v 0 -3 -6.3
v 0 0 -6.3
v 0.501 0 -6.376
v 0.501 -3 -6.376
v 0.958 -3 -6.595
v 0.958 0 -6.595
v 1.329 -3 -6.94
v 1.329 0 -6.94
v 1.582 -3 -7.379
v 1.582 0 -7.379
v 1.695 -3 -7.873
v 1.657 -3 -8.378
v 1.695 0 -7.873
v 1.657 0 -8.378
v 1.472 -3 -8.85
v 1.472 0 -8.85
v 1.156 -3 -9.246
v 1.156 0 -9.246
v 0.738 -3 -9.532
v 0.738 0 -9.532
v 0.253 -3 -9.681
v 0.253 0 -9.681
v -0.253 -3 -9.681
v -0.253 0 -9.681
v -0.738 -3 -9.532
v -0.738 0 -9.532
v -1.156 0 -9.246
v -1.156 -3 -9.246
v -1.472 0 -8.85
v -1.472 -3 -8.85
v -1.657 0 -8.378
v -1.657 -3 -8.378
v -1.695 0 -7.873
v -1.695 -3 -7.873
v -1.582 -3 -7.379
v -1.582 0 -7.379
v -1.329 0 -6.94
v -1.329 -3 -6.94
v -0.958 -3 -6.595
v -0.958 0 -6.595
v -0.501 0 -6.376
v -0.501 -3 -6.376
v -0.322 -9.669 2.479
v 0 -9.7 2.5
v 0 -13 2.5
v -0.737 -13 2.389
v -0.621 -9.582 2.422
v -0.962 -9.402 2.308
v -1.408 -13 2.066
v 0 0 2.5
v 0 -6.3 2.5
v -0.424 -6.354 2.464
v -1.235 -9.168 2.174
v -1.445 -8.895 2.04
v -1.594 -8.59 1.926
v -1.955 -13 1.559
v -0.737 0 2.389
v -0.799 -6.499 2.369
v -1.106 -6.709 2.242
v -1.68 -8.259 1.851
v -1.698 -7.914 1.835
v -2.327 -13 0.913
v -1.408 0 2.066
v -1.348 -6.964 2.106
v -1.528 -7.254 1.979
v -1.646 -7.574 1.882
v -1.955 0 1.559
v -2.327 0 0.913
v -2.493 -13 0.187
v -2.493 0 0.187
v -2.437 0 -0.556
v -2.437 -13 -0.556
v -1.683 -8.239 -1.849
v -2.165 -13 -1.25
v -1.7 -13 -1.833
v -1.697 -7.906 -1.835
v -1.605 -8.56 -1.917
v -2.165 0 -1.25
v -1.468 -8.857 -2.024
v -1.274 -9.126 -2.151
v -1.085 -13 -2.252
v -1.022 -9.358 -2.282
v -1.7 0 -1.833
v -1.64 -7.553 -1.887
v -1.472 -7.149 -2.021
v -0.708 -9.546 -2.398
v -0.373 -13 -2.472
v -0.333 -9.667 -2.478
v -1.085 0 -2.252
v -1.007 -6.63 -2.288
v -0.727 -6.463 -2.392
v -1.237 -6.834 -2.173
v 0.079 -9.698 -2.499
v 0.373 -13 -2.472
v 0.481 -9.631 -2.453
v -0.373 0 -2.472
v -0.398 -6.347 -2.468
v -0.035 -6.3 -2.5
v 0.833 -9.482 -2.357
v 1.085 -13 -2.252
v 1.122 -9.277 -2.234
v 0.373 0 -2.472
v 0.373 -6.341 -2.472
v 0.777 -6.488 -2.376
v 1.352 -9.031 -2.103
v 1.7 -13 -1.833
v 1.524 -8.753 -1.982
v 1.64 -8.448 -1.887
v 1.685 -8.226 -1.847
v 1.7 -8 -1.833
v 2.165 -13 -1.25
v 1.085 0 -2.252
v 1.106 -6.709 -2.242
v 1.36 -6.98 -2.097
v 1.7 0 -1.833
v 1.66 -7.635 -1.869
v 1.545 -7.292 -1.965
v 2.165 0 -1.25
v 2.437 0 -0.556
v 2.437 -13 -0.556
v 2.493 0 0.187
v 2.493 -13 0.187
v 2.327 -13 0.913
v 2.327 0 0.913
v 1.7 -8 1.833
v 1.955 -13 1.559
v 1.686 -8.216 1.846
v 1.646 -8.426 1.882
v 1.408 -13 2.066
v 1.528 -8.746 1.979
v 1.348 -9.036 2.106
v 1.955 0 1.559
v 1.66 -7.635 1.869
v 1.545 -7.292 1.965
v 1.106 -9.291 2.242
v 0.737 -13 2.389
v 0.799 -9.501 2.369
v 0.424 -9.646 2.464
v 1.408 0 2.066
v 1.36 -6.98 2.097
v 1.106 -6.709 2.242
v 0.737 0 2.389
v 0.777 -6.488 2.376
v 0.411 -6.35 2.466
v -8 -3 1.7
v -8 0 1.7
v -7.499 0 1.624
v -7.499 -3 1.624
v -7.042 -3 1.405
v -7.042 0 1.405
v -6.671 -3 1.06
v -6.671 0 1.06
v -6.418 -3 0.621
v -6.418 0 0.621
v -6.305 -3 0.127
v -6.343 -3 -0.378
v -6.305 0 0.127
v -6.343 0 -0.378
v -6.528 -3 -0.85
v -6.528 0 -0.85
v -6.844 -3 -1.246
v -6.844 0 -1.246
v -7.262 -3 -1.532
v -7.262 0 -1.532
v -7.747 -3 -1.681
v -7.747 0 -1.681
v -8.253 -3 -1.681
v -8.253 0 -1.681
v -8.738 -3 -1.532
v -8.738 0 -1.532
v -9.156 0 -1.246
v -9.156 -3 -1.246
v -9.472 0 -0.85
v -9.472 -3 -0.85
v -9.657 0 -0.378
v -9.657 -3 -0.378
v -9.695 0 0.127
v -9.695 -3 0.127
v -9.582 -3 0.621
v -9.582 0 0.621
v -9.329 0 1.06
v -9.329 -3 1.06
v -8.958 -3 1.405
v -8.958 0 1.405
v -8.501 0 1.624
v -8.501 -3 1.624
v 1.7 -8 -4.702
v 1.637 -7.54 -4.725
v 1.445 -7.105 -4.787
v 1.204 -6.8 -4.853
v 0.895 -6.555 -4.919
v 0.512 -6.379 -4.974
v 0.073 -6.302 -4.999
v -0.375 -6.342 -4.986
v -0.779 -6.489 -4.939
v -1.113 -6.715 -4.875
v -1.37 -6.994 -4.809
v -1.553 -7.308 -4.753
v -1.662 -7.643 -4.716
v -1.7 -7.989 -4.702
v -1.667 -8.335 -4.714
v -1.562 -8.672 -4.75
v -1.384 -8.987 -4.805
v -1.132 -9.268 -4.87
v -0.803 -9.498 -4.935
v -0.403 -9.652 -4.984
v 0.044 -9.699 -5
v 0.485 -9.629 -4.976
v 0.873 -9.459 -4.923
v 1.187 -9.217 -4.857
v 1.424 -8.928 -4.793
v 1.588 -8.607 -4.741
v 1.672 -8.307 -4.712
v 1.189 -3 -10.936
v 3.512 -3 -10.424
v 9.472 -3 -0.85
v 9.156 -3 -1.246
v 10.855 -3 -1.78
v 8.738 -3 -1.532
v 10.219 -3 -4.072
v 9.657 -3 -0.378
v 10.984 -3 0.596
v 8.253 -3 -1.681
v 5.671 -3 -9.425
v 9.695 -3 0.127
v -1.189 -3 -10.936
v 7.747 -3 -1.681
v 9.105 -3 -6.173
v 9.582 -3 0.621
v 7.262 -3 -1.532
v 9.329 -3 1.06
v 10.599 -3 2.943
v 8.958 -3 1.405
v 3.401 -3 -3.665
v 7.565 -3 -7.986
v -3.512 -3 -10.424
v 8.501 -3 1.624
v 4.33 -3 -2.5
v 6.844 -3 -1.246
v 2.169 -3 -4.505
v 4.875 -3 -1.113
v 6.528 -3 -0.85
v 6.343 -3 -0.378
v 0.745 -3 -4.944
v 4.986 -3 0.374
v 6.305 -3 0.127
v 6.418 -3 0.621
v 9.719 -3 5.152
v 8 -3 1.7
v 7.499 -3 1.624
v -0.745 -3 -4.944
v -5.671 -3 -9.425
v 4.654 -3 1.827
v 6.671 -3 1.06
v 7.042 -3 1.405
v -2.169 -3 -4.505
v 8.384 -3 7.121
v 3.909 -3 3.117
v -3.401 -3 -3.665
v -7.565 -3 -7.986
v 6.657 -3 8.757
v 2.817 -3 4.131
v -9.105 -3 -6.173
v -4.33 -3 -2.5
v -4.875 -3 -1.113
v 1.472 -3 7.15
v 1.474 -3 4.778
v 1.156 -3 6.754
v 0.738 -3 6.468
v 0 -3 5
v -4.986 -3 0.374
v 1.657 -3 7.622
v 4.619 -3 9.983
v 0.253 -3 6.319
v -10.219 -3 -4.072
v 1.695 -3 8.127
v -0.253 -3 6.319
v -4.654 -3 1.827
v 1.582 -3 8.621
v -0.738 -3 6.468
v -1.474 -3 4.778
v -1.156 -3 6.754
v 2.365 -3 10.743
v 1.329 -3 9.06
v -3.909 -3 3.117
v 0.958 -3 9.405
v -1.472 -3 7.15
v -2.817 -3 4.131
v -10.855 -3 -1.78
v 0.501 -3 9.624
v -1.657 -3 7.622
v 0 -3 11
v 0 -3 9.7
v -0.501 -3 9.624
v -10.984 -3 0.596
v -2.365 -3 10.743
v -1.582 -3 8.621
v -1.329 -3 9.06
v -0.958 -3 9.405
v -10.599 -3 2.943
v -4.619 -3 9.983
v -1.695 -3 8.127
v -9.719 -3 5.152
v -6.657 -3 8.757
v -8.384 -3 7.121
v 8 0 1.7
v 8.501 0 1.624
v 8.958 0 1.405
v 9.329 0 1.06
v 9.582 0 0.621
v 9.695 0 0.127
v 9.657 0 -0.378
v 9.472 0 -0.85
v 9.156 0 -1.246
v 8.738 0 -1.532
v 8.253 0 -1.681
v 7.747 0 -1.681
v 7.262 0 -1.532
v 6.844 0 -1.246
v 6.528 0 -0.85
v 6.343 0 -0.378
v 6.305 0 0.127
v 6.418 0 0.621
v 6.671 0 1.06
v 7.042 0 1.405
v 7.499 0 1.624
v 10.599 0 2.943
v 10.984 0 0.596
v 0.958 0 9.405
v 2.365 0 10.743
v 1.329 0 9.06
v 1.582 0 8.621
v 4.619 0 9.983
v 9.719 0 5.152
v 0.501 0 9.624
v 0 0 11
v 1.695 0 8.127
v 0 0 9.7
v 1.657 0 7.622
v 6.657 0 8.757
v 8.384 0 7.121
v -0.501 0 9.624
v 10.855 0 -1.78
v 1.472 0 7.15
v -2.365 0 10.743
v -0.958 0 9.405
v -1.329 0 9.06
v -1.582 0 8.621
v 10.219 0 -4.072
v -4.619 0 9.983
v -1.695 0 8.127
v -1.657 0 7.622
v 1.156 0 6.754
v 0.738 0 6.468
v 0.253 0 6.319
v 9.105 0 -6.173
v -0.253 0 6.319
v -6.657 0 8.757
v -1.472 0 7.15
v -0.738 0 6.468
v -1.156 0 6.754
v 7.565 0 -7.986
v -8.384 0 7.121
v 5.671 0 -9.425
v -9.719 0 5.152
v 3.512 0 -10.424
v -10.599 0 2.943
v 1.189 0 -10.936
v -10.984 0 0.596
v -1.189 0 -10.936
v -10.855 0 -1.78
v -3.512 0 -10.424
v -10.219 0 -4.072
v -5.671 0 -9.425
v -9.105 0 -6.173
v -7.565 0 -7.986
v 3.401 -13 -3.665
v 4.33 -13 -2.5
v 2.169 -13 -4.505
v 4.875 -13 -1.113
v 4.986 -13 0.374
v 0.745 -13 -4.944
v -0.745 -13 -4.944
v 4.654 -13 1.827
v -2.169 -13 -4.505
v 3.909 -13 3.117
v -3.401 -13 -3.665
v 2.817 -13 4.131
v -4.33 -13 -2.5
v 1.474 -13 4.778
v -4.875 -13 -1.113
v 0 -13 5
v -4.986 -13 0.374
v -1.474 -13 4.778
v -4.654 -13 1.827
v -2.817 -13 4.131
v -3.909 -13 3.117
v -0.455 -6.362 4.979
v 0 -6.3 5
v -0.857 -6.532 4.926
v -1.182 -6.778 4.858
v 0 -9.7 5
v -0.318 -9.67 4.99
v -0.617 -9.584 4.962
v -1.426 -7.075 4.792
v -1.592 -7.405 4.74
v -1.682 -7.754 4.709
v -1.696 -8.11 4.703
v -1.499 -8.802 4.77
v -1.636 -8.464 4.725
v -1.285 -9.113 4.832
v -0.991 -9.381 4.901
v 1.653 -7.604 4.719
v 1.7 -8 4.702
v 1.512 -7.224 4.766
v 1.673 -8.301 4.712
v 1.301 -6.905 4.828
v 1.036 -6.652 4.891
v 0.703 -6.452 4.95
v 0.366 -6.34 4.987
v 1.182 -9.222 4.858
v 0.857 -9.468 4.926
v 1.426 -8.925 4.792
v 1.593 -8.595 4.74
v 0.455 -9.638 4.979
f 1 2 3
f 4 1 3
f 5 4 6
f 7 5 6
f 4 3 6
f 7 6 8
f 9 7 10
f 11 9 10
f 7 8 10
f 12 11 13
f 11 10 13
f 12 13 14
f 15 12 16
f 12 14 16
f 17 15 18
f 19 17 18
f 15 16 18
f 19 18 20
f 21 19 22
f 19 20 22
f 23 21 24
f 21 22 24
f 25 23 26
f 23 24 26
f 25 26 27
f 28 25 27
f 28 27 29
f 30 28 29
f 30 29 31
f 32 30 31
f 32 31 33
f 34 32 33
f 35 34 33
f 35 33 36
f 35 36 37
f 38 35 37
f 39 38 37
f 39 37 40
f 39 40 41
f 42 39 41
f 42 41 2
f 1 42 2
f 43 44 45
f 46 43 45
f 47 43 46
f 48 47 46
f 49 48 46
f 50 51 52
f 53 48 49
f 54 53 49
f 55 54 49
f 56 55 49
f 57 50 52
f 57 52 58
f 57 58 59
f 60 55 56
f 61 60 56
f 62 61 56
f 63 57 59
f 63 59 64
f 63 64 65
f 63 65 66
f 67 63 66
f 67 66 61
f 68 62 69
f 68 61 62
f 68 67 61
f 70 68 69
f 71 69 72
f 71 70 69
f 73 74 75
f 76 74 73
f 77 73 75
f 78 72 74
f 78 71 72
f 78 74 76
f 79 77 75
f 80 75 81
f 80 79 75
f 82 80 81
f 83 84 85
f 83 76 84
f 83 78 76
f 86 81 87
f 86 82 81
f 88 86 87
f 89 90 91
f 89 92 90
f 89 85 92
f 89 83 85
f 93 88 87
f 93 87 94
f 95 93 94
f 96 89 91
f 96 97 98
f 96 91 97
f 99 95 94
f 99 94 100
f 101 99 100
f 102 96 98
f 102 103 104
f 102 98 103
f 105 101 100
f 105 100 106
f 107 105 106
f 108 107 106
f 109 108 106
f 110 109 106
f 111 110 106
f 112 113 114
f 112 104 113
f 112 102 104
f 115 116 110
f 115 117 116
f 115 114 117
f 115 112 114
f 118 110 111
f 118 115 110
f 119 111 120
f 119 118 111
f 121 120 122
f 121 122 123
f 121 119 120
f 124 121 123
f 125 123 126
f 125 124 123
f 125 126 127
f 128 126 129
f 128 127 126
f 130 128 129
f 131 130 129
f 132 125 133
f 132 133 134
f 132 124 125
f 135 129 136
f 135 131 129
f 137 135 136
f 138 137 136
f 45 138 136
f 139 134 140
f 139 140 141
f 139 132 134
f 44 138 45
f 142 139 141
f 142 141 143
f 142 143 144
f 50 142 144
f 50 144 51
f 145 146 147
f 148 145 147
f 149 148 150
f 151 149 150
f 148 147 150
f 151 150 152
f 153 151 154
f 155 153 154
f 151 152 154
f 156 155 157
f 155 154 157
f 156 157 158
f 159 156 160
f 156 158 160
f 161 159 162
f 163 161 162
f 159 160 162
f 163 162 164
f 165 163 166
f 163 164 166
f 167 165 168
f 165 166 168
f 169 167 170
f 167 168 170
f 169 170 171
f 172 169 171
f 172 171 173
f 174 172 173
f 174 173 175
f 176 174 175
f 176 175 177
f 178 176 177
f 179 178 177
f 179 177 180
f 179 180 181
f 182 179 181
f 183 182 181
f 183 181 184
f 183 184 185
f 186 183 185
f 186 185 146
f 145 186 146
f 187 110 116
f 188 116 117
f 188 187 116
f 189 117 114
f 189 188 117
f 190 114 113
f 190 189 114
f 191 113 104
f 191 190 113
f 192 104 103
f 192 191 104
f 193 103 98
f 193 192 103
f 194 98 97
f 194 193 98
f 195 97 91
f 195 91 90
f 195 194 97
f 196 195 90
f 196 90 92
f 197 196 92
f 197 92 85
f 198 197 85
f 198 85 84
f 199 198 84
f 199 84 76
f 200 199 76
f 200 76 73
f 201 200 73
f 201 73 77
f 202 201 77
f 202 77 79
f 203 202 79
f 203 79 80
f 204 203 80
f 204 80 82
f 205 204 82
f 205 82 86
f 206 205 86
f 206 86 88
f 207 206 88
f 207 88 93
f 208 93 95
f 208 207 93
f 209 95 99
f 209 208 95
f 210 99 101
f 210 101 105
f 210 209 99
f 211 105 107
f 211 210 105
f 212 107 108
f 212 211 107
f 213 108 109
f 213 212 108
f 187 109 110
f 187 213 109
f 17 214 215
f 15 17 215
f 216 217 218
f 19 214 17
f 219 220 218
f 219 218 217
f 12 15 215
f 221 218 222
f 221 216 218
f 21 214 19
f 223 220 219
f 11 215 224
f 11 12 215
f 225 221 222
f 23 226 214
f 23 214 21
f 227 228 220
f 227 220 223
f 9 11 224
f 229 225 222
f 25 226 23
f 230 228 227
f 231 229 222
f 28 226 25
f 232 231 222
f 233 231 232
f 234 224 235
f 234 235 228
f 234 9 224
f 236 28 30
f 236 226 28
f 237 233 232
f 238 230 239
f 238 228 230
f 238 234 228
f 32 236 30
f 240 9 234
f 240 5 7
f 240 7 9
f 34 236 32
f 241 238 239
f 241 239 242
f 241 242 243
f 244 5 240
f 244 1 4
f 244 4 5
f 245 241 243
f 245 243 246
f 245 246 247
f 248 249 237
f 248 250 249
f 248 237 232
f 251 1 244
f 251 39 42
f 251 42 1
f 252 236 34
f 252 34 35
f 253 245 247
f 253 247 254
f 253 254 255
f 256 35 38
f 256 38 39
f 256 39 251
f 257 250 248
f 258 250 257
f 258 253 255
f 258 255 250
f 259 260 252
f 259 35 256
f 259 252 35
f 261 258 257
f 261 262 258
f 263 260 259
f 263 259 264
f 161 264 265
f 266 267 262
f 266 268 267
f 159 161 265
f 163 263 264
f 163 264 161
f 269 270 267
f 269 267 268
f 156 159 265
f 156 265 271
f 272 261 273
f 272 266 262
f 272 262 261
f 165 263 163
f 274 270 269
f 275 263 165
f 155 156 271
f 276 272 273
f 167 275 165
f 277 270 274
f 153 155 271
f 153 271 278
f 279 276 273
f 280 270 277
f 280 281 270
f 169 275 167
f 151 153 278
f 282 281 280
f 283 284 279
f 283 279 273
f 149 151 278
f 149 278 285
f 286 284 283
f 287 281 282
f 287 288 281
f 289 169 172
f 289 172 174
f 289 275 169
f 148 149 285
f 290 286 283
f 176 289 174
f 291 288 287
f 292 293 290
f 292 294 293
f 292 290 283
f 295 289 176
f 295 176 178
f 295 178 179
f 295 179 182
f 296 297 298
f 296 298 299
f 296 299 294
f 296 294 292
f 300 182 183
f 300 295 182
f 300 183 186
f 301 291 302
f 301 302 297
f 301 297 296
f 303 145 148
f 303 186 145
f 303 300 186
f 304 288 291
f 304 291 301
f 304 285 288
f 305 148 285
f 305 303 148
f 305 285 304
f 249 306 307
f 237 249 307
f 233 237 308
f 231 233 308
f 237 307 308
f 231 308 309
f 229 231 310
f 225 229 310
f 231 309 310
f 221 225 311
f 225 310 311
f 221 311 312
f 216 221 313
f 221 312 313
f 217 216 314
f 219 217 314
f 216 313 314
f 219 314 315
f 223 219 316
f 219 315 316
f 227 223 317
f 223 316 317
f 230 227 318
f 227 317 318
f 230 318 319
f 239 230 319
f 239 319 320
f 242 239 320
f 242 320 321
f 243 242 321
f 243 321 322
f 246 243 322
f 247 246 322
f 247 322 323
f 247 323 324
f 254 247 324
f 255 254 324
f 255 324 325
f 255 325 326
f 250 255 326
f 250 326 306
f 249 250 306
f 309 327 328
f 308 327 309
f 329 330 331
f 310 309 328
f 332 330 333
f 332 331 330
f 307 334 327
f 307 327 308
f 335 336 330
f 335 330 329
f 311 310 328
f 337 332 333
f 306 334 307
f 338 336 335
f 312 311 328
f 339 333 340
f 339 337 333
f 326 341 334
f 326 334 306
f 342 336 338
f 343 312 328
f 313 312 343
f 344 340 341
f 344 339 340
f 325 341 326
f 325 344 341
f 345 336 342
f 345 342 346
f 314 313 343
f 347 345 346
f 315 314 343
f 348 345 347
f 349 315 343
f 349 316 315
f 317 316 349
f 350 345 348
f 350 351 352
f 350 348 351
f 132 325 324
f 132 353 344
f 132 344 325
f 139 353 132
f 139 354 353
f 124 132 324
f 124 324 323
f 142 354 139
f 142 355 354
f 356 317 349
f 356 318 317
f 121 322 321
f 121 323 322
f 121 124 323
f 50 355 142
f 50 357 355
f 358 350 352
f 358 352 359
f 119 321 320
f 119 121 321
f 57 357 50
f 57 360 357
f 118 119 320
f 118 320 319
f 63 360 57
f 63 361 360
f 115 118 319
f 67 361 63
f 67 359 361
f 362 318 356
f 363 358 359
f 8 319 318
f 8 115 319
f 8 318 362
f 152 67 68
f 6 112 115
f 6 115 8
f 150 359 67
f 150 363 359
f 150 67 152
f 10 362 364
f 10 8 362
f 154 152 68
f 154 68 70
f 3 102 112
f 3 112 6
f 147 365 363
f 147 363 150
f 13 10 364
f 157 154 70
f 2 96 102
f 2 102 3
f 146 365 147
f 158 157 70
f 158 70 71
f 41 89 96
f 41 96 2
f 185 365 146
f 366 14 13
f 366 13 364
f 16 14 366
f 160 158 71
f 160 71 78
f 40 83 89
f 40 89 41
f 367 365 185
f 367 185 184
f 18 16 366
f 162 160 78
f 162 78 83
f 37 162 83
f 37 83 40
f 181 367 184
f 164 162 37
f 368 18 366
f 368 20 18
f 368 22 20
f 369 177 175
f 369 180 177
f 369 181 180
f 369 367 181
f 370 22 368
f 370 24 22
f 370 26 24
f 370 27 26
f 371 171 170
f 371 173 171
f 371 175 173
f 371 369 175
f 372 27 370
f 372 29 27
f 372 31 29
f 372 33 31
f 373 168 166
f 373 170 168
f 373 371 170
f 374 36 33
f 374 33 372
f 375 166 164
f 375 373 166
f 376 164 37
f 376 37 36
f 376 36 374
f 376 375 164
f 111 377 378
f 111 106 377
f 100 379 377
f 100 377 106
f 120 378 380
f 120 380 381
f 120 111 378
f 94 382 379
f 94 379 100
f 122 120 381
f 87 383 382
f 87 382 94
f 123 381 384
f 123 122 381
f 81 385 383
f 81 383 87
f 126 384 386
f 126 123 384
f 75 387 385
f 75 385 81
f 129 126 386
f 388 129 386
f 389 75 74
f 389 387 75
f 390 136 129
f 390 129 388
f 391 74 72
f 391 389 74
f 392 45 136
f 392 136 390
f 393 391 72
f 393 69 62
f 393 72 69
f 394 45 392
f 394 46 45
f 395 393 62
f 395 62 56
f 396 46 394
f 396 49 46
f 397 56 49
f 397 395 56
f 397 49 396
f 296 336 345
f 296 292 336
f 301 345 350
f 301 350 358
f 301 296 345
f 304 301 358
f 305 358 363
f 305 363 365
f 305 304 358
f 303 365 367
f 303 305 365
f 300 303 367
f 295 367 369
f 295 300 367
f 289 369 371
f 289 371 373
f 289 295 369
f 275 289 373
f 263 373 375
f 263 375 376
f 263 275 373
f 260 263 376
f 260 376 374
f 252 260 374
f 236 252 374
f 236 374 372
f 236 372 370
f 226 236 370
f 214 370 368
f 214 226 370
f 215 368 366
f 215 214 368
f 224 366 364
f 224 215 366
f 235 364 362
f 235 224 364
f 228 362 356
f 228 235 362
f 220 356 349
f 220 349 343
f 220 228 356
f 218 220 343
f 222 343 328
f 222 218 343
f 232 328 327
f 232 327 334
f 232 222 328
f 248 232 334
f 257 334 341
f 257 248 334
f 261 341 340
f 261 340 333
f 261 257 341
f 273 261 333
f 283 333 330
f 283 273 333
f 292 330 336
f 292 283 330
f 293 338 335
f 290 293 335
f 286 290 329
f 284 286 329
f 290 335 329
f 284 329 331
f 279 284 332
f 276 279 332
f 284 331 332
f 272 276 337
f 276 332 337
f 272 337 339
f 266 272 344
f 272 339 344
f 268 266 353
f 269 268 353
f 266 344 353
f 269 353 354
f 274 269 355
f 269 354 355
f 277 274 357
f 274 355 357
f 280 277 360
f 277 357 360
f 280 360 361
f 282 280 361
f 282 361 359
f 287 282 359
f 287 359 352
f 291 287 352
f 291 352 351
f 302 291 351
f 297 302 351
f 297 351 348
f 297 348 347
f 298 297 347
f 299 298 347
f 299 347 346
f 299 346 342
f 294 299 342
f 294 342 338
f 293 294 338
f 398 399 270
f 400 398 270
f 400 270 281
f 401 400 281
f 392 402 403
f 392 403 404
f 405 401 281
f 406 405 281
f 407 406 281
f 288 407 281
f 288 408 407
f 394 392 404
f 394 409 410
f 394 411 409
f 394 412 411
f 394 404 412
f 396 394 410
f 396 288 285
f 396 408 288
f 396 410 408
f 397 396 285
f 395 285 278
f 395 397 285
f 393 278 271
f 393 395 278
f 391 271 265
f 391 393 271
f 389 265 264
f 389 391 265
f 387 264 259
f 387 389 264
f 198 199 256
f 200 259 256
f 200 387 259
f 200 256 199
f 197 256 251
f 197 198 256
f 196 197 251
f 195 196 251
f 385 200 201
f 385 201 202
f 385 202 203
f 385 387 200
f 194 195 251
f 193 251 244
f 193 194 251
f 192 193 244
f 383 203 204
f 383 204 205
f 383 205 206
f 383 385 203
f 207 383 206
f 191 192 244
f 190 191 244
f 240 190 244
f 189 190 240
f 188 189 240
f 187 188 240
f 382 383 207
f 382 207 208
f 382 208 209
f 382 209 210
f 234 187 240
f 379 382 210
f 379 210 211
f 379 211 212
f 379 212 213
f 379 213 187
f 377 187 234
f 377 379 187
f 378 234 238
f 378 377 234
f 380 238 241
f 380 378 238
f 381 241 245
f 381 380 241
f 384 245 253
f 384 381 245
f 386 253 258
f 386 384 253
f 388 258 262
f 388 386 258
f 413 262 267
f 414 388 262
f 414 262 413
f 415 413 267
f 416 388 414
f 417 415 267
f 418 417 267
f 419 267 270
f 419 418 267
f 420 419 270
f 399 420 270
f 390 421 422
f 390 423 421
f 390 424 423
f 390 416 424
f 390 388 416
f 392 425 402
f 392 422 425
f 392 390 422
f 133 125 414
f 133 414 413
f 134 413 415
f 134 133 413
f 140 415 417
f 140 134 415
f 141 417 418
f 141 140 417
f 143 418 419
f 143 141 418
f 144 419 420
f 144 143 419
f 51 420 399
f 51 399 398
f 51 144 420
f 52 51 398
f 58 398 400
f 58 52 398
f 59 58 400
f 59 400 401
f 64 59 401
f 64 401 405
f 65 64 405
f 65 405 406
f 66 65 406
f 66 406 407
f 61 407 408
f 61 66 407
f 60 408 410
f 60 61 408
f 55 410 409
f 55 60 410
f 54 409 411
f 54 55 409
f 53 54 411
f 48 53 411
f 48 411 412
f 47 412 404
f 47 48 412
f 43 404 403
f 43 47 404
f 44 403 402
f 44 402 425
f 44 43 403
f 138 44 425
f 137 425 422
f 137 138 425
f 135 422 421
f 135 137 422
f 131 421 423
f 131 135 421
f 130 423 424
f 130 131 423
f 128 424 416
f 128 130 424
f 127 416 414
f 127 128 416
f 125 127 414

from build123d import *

# Parameters (mm, degrees)
SKETCH_2_R               = 1.7
CUT_EXTRUDE_1_DEPTH      = 10
CUT_EXTRUDE_2_DEPTH      = 21.273134933
CUT_EXTRUDE_2_DEPTH_BACK = 21.273134933
SKETCH_3_R               = 1.7


with BuildPart() as part:
    # 草图1 → 旋转1 (revolve)
    with BuildSketch(Plane.XY, mode=Mode.PRIVATE) as revolve_1_sk:
        Polygon((-2.5, 0), (-11, 0), (-11, -3), (-5, -3), (-5, -13), (-2.5, -13), align=None)
    revolve(revolve_1_sk.sketch.rotate(Axis((0, 0, 0), (0, -1, 0)), 270), axis=Axis((0, 0, 0), (0, -1, 0)))

    # 草图2 → 切除-拉伸1 (cut)
    with BuildSketch(Plane(origin=(0, 0, 0), x_dir=(1, 0, 0), z_dir=(0, 1, 0))):
        with Locations(Location((0, 8, 0), (0, 0, 270))):
            Circle(SKETCH_2_R)
        with Locations(Location((8, 0, 0), (0, 0, 270))):
            Circle(SKETCH_2_R)
        with Locations(Location((0, -8, 0), (0, 0, 270))):
            Circle(SKETCH_2_R)
        with Locations(Location((-8, 0, 0), (0, 0, 270))):
            Circle(SKETCH_2_R)
    extrude(amount=-CUT_EXTRUDE_1_DEPTH, mode=Mode.SUBTRACT)

    # 草图3 → 切除-拉伸2 (cut, two sides: drawn at the far end of the back side and taken through both)
    with BuildSketch(Plane.XY.offset(-CUT_EXTRUDE_2_DEPTH_BACK)):
        with Locations((0, -8)):
            Circle(SKETCH_3_R)
    extrude(amount=CUT_EXTRUDE_2_DEPTH + CUT_EXTRUDE_2_DEPTH_BACK, mode=Mode.SUBTRACT)


solid = part.part
